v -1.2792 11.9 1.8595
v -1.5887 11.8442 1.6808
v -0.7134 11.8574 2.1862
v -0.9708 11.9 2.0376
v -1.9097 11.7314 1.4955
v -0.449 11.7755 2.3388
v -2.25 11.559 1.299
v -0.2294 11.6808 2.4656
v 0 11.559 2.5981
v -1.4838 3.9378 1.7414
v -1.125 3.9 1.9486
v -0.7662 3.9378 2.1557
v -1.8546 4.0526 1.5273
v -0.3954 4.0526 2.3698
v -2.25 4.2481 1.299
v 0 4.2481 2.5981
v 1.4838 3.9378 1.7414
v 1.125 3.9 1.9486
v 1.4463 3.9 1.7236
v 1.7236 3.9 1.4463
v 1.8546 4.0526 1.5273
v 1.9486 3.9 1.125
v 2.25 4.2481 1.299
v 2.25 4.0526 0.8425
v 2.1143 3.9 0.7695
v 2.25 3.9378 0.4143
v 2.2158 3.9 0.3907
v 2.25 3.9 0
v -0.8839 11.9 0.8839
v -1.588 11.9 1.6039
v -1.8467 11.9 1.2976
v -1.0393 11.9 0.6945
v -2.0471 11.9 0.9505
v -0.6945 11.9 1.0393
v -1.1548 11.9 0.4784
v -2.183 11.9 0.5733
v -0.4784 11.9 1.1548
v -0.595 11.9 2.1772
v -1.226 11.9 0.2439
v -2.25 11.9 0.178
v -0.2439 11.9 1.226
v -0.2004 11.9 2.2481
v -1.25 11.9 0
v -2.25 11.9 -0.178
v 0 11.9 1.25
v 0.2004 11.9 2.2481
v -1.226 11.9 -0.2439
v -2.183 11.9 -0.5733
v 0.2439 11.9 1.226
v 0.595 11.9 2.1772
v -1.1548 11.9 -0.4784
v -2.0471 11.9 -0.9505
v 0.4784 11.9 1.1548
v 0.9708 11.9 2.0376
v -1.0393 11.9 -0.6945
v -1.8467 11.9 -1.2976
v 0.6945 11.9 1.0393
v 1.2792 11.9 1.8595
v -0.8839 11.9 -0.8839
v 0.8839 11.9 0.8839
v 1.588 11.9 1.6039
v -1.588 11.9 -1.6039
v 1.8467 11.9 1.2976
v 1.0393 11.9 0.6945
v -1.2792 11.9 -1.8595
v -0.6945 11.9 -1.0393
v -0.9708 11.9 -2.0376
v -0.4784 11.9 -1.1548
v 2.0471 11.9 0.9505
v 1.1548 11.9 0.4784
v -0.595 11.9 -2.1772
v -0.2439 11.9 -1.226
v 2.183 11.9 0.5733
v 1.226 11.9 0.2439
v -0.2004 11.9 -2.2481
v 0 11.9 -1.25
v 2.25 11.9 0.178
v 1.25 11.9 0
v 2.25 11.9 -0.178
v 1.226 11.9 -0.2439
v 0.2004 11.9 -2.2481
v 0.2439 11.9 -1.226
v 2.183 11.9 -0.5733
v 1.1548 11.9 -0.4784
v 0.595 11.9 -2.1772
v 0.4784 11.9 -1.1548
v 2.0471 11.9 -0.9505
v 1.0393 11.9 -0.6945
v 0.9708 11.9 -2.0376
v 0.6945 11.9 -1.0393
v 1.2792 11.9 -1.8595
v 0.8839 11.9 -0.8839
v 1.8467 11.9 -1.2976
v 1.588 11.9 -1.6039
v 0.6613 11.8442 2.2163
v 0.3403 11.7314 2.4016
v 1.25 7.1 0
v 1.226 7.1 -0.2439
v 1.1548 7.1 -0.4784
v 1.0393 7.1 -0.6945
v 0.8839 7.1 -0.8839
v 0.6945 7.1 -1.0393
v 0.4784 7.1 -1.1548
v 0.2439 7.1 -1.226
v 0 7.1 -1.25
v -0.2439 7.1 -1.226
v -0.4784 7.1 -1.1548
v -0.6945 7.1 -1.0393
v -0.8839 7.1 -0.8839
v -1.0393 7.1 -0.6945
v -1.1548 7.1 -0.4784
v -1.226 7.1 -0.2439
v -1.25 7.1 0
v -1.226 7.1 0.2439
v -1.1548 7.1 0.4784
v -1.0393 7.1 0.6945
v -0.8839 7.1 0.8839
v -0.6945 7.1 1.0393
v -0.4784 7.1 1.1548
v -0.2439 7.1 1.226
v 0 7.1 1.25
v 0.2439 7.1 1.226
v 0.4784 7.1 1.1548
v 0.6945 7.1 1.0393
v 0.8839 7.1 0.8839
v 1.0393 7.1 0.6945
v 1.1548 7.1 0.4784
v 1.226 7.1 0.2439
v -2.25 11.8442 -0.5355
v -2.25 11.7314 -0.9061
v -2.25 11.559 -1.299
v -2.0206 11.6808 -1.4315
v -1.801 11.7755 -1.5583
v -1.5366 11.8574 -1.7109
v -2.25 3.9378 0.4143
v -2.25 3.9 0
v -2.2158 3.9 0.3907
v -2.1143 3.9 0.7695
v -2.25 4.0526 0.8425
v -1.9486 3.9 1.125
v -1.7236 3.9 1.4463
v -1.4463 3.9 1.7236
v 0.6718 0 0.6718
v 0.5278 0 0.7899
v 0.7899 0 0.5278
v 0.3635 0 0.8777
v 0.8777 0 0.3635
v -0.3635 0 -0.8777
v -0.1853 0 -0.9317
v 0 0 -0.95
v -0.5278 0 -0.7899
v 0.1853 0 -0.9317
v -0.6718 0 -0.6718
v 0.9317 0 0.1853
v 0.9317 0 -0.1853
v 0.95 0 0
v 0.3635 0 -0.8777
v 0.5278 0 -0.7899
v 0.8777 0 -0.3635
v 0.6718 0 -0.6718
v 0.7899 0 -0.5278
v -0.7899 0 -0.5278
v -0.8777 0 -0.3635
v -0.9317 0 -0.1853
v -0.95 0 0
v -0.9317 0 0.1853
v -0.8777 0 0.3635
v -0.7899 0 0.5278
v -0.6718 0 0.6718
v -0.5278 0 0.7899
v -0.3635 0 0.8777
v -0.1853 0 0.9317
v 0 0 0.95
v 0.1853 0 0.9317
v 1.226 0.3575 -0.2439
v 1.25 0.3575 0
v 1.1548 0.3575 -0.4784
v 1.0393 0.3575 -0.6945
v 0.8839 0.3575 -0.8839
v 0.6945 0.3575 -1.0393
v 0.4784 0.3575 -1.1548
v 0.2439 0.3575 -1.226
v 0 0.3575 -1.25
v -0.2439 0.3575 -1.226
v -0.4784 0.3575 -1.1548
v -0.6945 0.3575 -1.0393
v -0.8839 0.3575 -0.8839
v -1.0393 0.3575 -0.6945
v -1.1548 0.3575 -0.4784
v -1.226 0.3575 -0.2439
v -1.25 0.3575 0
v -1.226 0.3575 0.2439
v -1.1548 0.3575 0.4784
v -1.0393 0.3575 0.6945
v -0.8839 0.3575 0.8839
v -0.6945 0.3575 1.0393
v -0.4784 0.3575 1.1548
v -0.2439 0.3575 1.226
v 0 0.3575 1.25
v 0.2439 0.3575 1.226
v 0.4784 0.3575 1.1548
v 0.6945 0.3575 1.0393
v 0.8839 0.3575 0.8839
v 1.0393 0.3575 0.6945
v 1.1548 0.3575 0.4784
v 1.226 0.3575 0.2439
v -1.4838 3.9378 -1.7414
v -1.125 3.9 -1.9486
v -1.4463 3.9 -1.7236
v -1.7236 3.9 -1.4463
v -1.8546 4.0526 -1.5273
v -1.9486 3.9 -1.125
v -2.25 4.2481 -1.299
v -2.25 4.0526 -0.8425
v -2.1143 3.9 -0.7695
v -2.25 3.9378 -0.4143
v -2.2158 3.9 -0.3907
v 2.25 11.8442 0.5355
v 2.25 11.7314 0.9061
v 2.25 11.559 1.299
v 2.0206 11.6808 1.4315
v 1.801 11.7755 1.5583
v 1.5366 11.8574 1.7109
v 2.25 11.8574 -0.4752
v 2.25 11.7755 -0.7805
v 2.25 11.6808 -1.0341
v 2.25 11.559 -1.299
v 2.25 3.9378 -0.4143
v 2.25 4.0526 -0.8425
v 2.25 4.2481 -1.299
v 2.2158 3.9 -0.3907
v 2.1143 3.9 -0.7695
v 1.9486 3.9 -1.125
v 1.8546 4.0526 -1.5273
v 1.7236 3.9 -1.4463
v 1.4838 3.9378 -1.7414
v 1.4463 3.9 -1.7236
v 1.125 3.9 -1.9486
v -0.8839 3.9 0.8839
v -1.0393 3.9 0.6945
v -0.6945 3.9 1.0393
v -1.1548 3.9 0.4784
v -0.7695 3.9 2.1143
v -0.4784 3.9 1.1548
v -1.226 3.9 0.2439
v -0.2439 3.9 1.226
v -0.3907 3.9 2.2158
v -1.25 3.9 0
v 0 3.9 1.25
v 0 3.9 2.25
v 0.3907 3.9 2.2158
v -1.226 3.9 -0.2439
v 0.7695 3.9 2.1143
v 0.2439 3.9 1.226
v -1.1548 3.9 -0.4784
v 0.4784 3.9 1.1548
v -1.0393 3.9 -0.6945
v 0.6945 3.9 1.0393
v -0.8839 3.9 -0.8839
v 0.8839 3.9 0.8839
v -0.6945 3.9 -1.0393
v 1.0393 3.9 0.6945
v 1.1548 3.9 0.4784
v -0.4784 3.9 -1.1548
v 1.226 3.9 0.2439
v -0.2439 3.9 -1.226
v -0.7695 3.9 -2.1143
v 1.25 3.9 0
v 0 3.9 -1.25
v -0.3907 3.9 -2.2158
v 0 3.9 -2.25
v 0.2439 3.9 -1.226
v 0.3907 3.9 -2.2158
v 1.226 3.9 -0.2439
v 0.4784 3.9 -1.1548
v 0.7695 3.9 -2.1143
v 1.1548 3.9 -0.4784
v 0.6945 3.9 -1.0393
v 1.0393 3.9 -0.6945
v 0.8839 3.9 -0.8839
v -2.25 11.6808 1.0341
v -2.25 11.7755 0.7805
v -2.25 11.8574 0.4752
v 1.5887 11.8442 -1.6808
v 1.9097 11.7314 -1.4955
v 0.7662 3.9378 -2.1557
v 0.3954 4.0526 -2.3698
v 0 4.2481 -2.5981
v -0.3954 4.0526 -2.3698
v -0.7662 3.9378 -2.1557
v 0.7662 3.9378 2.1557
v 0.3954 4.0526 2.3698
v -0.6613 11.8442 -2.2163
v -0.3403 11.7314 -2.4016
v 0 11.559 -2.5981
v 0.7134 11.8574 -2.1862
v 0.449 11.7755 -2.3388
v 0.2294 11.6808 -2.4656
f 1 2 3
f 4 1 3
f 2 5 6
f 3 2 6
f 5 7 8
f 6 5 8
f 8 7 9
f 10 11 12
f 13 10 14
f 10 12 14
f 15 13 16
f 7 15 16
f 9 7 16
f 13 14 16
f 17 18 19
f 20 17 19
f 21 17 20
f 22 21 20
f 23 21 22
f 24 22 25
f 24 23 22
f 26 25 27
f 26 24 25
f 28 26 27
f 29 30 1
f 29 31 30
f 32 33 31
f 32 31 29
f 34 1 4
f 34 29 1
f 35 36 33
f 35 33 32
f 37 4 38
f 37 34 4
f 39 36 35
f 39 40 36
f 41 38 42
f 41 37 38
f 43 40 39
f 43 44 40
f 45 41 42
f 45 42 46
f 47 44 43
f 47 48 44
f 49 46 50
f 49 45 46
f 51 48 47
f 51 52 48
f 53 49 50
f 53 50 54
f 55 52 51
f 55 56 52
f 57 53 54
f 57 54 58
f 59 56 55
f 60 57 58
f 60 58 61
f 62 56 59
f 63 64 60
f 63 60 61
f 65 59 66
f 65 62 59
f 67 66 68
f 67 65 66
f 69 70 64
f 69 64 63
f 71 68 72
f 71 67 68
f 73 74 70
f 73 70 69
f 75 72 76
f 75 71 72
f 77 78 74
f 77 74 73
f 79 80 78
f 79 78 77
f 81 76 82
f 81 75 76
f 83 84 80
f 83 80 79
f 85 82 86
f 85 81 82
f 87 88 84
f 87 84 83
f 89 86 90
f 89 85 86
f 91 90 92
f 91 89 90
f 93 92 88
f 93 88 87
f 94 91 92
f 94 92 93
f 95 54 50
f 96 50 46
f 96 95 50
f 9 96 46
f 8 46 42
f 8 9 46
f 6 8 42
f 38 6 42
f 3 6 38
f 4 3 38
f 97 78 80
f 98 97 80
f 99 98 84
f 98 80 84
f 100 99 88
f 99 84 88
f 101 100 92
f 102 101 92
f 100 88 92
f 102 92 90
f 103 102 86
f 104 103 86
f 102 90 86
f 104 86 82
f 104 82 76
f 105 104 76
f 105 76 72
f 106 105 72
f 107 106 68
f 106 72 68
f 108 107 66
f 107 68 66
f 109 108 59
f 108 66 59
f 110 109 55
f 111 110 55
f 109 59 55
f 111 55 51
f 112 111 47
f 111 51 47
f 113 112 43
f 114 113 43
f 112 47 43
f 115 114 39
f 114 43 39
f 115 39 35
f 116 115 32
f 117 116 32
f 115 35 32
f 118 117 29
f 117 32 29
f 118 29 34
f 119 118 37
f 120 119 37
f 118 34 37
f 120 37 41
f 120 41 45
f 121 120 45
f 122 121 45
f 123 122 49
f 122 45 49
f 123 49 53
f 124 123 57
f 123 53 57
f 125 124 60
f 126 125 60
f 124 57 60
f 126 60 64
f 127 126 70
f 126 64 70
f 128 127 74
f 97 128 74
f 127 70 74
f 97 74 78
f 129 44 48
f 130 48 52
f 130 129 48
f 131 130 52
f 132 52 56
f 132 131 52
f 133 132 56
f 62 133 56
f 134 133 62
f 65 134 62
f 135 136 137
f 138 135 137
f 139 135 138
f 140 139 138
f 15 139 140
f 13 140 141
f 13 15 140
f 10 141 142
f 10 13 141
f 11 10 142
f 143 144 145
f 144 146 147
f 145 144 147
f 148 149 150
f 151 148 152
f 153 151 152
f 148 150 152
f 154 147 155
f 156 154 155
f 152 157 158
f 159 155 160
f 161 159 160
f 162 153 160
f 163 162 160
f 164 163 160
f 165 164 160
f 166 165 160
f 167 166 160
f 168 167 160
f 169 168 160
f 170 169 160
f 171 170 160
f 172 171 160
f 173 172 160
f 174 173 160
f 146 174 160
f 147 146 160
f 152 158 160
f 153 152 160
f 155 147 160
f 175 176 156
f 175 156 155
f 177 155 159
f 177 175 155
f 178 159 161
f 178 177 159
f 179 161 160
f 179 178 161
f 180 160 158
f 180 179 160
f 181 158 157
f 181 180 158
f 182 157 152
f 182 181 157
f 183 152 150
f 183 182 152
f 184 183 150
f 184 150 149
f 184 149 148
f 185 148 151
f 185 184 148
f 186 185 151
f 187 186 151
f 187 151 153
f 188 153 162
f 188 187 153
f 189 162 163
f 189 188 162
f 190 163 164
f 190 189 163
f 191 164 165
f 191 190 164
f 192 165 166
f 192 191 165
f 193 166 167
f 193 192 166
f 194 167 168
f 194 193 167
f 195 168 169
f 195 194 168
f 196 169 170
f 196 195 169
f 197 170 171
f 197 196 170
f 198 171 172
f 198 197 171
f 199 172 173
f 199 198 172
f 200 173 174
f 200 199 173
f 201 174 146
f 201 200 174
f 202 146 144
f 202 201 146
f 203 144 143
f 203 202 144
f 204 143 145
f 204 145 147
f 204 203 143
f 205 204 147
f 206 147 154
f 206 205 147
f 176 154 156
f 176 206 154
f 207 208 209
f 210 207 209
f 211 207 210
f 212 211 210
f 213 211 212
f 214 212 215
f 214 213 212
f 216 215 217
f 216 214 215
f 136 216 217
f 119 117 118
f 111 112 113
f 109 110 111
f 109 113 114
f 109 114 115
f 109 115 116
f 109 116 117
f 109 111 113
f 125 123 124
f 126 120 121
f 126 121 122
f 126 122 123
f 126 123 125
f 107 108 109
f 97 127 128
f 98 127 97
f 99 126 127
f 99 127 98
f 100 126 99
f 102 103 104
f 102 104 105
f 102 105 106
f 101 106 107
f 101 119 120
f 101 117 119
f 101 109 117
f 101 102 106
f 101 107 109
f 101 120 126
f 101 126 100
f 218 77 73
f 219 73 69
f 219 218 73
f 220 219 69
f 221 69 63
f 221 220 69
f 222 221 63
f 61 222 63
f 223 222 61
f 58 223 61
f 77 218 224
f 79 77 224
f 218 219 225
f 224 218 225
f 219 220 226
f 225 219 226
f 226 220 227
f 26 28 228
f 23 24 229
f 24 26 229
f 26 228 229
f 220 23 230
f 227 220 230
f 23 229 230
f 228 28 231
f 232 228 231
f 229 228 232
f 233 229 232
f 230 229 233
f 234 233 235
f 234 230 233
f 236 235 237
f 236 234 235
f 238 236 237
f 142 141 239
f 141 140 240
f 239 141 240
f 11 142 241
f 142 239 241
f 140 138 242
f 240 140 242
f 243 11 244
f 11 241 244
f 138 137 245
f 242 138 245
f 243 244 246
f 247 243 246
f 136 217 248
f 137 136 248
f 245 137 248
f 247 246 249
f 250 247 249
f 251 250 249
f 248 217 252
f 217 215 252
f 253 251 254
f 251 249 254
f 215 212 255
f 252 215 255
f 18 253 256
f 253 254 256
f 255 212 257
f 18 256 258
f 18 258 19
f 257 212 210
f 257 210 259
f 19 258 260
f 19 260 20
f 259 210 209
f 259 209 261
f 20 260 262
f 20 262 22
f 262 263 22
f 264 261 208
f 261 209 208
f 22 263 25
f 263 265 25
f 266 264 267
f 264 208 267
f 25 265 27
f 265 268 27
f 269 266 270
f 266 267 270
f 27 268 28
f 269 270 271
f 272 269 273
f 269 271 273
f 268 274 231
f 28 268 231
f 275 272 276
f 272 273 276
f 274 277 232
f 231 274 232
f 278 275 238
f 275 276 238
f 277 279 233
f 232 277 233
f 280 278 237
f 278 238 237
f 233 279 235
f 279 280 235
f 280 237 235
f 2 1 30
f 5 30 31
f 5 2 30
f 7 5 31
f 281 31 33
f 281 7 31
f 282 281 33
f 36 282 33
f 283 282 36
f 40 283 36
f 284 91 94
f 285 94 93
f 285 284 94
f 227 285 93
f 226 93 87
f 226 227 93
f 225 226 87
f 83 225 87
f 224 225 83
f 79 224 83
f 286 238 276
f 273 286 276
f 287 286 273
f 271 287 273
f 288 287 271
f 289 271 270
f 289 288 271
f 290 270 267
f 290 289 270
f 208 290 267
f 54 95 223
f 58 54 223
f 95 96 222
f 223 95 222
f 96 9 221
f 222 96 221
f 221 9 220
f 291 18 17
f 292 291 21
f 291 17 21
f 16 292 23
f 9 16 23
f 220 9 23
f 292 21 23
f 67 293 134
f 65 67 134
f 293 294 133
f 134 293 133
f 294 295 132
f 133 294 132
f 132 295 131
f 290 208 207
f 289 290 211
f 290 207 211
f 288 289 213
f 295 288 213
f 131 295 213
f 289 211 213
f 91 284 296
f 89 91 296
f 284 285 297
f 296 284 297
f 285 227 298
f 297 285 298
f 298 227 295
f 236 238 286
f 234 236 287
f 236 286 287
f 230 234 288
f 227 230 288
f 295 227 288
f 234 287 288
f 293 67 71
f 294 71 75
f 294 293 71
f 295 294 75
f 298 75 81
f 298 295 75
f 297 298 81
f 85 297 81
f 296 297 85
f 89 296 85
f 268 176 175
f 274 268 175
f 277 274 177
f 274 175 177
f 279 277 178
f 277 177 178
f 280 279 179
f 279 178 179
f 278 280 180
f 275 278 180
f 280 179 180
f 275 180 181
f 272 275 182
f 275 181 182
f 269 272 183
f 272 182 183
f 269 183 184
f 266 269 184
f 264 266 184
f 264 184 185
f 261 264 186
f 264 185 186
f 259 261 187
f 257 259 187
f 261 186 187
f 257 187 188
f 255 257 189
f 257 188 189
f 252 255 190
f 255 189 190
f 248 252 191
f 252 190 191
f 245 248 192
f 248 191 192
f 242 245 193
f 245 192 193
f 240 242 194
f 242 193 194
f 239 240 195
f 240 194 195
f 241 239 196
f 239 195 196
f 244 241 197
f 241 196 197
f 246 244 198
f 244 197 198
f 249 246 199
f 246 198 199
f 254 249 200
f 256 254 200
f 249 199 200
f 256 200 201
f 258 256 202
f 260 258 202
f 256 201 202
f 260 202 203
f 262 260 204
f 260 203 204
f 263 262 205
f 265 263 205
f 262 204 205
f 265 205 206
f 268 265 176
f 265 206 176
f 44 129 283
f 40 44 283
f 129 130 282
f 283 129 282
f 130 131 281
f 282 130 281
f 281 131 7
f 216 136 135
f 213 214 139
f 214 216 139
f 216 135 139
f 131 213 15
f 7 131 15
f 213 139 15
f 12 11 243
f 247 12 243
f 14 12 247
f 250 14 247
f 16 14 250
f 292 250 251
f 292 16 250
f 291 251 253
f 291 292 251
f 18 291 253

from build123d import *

# Parameters (mm, degrees)
SKETCH1_R           = 1.25
BOSS_EXTRUDE1_DEPTH = 3.9
BOSS_EXTRUDE2_DEPTH = 8
SKETCH4_R           = 1.25
CUT_EXTRUDE1_DEPTH  = 4.8
SKETCH5_OUTSIDE_W   = 35.048
SKETCH5_OUTSIDE_H   = 35.744
SKETCH5_OUTSIDE_R   = 2.257033445
CUT_EXTRUDE2_DEPTH  = 12.9
CUT_EXTRUDE2_TAPER  = 45
SKETCH6_OUTSIDE_W   = 27.248
SKETCH6_OUTSIDE_H   = 27.944
SKETCH6_OUTSIDE_R   = 2.25
CUT_EXTRUDE3_DEPTH  = 9
CUT_EXTRUDE3_TAPER  = 45
CHAMFER1_SIZE       = 0.3
CHAMFER1_SIZE2      = 0.357526078


with BuildPart() as part:
    # Sketch1 → Boss-Extrude1 (new body)
    with BuildSketch(Plane(origin=(0, 0, 0), x_dir=(1, 0, 0), z_dir=(0, 1, 0))):
        Circle(SKETCH1_R)
    extrude(amount=BOSS_EXTRUDE1_DEPTH)

    # Sketch3 → Boss-Extrude2 (add)
    with BuildSketch(Plane(origin=(0, 3.9, 0), x_dir=(1, 0, 0), z_dir=(0, 1, 0))):
        Polygon((-2.25, 1.299038106), (-2.25, -1.299038106), (0, -2.598076211), (2.25, -1.299038106), (2.25, 1.299038106), (0, 2.598076211), align=None)
    extrude(amount=BOSS_EXTRUDE2_DEPTH)

    # Sketch4 → Cut-Extrude1 (cut)
    with BuildSketch(Plane(origin=(0, 11.9, 0), x_dir=(1, 0, 0), z_dir=(0, 1, 0))):
        Circle(SKETCH4_R)
    extrude(amount=-CUT_EXTRUDE1_DEPTH, mode=Mode.SUBTRACT)

    # Sketch5 outside → Cut-Extrude2 (cut, through all)
    with BuildSketch(Plane(origin=(0, 11.9, 0), x_dir=(1, 0, 0), z_dir=(0, 1, 0))):
        Rectangle(SKETCH5_OUTSIDE_W, SKETCH5_OUTSIDE_H)
        Circle(SKETCH5_OUTSIDE_R, mode=Mode.SUBTRACT)
    extrude(amount=-CUT_EXTRUDE2_DEPTH, taper=CUT_EXTRUDE2_TAPER, mode=Mode.SUBTRACT)

    # Sketch6 outside → Cut-Extrude3 (cut, through all)
    with BuildSketch(Plane.XZ.offset(-3.9)):
        Rectangle(SKETCH6_OUTSIDE_W, SKETCH6_OUTSIDE_H)
        Circle(SKETCH6_OUTSIDE_R, mode=Mode.SUBTRACT)
    extrude(amount=-CUT_EXTRUDE3_DEPTH, taper=CUT_EXTRUDE3_TAPER, mode=Mode.SUBTRACT)

    # Chamfer1
    chamfer1_edges = [part.edges().sort_by_distance(p)[0] for p in [
        (-1.25, 0, 0),
    ]]
    chamfer1_side = [part.faces().sort_by_distance(p)[0] for p in [
        (0, 0, 0),
    ]]
    chamfer(chamfer1_edges, length=CHAMFER1_SIZE, length2=CHAMFER1_SIZE2, reference=chamfer1_side[0])


solid = part.part
